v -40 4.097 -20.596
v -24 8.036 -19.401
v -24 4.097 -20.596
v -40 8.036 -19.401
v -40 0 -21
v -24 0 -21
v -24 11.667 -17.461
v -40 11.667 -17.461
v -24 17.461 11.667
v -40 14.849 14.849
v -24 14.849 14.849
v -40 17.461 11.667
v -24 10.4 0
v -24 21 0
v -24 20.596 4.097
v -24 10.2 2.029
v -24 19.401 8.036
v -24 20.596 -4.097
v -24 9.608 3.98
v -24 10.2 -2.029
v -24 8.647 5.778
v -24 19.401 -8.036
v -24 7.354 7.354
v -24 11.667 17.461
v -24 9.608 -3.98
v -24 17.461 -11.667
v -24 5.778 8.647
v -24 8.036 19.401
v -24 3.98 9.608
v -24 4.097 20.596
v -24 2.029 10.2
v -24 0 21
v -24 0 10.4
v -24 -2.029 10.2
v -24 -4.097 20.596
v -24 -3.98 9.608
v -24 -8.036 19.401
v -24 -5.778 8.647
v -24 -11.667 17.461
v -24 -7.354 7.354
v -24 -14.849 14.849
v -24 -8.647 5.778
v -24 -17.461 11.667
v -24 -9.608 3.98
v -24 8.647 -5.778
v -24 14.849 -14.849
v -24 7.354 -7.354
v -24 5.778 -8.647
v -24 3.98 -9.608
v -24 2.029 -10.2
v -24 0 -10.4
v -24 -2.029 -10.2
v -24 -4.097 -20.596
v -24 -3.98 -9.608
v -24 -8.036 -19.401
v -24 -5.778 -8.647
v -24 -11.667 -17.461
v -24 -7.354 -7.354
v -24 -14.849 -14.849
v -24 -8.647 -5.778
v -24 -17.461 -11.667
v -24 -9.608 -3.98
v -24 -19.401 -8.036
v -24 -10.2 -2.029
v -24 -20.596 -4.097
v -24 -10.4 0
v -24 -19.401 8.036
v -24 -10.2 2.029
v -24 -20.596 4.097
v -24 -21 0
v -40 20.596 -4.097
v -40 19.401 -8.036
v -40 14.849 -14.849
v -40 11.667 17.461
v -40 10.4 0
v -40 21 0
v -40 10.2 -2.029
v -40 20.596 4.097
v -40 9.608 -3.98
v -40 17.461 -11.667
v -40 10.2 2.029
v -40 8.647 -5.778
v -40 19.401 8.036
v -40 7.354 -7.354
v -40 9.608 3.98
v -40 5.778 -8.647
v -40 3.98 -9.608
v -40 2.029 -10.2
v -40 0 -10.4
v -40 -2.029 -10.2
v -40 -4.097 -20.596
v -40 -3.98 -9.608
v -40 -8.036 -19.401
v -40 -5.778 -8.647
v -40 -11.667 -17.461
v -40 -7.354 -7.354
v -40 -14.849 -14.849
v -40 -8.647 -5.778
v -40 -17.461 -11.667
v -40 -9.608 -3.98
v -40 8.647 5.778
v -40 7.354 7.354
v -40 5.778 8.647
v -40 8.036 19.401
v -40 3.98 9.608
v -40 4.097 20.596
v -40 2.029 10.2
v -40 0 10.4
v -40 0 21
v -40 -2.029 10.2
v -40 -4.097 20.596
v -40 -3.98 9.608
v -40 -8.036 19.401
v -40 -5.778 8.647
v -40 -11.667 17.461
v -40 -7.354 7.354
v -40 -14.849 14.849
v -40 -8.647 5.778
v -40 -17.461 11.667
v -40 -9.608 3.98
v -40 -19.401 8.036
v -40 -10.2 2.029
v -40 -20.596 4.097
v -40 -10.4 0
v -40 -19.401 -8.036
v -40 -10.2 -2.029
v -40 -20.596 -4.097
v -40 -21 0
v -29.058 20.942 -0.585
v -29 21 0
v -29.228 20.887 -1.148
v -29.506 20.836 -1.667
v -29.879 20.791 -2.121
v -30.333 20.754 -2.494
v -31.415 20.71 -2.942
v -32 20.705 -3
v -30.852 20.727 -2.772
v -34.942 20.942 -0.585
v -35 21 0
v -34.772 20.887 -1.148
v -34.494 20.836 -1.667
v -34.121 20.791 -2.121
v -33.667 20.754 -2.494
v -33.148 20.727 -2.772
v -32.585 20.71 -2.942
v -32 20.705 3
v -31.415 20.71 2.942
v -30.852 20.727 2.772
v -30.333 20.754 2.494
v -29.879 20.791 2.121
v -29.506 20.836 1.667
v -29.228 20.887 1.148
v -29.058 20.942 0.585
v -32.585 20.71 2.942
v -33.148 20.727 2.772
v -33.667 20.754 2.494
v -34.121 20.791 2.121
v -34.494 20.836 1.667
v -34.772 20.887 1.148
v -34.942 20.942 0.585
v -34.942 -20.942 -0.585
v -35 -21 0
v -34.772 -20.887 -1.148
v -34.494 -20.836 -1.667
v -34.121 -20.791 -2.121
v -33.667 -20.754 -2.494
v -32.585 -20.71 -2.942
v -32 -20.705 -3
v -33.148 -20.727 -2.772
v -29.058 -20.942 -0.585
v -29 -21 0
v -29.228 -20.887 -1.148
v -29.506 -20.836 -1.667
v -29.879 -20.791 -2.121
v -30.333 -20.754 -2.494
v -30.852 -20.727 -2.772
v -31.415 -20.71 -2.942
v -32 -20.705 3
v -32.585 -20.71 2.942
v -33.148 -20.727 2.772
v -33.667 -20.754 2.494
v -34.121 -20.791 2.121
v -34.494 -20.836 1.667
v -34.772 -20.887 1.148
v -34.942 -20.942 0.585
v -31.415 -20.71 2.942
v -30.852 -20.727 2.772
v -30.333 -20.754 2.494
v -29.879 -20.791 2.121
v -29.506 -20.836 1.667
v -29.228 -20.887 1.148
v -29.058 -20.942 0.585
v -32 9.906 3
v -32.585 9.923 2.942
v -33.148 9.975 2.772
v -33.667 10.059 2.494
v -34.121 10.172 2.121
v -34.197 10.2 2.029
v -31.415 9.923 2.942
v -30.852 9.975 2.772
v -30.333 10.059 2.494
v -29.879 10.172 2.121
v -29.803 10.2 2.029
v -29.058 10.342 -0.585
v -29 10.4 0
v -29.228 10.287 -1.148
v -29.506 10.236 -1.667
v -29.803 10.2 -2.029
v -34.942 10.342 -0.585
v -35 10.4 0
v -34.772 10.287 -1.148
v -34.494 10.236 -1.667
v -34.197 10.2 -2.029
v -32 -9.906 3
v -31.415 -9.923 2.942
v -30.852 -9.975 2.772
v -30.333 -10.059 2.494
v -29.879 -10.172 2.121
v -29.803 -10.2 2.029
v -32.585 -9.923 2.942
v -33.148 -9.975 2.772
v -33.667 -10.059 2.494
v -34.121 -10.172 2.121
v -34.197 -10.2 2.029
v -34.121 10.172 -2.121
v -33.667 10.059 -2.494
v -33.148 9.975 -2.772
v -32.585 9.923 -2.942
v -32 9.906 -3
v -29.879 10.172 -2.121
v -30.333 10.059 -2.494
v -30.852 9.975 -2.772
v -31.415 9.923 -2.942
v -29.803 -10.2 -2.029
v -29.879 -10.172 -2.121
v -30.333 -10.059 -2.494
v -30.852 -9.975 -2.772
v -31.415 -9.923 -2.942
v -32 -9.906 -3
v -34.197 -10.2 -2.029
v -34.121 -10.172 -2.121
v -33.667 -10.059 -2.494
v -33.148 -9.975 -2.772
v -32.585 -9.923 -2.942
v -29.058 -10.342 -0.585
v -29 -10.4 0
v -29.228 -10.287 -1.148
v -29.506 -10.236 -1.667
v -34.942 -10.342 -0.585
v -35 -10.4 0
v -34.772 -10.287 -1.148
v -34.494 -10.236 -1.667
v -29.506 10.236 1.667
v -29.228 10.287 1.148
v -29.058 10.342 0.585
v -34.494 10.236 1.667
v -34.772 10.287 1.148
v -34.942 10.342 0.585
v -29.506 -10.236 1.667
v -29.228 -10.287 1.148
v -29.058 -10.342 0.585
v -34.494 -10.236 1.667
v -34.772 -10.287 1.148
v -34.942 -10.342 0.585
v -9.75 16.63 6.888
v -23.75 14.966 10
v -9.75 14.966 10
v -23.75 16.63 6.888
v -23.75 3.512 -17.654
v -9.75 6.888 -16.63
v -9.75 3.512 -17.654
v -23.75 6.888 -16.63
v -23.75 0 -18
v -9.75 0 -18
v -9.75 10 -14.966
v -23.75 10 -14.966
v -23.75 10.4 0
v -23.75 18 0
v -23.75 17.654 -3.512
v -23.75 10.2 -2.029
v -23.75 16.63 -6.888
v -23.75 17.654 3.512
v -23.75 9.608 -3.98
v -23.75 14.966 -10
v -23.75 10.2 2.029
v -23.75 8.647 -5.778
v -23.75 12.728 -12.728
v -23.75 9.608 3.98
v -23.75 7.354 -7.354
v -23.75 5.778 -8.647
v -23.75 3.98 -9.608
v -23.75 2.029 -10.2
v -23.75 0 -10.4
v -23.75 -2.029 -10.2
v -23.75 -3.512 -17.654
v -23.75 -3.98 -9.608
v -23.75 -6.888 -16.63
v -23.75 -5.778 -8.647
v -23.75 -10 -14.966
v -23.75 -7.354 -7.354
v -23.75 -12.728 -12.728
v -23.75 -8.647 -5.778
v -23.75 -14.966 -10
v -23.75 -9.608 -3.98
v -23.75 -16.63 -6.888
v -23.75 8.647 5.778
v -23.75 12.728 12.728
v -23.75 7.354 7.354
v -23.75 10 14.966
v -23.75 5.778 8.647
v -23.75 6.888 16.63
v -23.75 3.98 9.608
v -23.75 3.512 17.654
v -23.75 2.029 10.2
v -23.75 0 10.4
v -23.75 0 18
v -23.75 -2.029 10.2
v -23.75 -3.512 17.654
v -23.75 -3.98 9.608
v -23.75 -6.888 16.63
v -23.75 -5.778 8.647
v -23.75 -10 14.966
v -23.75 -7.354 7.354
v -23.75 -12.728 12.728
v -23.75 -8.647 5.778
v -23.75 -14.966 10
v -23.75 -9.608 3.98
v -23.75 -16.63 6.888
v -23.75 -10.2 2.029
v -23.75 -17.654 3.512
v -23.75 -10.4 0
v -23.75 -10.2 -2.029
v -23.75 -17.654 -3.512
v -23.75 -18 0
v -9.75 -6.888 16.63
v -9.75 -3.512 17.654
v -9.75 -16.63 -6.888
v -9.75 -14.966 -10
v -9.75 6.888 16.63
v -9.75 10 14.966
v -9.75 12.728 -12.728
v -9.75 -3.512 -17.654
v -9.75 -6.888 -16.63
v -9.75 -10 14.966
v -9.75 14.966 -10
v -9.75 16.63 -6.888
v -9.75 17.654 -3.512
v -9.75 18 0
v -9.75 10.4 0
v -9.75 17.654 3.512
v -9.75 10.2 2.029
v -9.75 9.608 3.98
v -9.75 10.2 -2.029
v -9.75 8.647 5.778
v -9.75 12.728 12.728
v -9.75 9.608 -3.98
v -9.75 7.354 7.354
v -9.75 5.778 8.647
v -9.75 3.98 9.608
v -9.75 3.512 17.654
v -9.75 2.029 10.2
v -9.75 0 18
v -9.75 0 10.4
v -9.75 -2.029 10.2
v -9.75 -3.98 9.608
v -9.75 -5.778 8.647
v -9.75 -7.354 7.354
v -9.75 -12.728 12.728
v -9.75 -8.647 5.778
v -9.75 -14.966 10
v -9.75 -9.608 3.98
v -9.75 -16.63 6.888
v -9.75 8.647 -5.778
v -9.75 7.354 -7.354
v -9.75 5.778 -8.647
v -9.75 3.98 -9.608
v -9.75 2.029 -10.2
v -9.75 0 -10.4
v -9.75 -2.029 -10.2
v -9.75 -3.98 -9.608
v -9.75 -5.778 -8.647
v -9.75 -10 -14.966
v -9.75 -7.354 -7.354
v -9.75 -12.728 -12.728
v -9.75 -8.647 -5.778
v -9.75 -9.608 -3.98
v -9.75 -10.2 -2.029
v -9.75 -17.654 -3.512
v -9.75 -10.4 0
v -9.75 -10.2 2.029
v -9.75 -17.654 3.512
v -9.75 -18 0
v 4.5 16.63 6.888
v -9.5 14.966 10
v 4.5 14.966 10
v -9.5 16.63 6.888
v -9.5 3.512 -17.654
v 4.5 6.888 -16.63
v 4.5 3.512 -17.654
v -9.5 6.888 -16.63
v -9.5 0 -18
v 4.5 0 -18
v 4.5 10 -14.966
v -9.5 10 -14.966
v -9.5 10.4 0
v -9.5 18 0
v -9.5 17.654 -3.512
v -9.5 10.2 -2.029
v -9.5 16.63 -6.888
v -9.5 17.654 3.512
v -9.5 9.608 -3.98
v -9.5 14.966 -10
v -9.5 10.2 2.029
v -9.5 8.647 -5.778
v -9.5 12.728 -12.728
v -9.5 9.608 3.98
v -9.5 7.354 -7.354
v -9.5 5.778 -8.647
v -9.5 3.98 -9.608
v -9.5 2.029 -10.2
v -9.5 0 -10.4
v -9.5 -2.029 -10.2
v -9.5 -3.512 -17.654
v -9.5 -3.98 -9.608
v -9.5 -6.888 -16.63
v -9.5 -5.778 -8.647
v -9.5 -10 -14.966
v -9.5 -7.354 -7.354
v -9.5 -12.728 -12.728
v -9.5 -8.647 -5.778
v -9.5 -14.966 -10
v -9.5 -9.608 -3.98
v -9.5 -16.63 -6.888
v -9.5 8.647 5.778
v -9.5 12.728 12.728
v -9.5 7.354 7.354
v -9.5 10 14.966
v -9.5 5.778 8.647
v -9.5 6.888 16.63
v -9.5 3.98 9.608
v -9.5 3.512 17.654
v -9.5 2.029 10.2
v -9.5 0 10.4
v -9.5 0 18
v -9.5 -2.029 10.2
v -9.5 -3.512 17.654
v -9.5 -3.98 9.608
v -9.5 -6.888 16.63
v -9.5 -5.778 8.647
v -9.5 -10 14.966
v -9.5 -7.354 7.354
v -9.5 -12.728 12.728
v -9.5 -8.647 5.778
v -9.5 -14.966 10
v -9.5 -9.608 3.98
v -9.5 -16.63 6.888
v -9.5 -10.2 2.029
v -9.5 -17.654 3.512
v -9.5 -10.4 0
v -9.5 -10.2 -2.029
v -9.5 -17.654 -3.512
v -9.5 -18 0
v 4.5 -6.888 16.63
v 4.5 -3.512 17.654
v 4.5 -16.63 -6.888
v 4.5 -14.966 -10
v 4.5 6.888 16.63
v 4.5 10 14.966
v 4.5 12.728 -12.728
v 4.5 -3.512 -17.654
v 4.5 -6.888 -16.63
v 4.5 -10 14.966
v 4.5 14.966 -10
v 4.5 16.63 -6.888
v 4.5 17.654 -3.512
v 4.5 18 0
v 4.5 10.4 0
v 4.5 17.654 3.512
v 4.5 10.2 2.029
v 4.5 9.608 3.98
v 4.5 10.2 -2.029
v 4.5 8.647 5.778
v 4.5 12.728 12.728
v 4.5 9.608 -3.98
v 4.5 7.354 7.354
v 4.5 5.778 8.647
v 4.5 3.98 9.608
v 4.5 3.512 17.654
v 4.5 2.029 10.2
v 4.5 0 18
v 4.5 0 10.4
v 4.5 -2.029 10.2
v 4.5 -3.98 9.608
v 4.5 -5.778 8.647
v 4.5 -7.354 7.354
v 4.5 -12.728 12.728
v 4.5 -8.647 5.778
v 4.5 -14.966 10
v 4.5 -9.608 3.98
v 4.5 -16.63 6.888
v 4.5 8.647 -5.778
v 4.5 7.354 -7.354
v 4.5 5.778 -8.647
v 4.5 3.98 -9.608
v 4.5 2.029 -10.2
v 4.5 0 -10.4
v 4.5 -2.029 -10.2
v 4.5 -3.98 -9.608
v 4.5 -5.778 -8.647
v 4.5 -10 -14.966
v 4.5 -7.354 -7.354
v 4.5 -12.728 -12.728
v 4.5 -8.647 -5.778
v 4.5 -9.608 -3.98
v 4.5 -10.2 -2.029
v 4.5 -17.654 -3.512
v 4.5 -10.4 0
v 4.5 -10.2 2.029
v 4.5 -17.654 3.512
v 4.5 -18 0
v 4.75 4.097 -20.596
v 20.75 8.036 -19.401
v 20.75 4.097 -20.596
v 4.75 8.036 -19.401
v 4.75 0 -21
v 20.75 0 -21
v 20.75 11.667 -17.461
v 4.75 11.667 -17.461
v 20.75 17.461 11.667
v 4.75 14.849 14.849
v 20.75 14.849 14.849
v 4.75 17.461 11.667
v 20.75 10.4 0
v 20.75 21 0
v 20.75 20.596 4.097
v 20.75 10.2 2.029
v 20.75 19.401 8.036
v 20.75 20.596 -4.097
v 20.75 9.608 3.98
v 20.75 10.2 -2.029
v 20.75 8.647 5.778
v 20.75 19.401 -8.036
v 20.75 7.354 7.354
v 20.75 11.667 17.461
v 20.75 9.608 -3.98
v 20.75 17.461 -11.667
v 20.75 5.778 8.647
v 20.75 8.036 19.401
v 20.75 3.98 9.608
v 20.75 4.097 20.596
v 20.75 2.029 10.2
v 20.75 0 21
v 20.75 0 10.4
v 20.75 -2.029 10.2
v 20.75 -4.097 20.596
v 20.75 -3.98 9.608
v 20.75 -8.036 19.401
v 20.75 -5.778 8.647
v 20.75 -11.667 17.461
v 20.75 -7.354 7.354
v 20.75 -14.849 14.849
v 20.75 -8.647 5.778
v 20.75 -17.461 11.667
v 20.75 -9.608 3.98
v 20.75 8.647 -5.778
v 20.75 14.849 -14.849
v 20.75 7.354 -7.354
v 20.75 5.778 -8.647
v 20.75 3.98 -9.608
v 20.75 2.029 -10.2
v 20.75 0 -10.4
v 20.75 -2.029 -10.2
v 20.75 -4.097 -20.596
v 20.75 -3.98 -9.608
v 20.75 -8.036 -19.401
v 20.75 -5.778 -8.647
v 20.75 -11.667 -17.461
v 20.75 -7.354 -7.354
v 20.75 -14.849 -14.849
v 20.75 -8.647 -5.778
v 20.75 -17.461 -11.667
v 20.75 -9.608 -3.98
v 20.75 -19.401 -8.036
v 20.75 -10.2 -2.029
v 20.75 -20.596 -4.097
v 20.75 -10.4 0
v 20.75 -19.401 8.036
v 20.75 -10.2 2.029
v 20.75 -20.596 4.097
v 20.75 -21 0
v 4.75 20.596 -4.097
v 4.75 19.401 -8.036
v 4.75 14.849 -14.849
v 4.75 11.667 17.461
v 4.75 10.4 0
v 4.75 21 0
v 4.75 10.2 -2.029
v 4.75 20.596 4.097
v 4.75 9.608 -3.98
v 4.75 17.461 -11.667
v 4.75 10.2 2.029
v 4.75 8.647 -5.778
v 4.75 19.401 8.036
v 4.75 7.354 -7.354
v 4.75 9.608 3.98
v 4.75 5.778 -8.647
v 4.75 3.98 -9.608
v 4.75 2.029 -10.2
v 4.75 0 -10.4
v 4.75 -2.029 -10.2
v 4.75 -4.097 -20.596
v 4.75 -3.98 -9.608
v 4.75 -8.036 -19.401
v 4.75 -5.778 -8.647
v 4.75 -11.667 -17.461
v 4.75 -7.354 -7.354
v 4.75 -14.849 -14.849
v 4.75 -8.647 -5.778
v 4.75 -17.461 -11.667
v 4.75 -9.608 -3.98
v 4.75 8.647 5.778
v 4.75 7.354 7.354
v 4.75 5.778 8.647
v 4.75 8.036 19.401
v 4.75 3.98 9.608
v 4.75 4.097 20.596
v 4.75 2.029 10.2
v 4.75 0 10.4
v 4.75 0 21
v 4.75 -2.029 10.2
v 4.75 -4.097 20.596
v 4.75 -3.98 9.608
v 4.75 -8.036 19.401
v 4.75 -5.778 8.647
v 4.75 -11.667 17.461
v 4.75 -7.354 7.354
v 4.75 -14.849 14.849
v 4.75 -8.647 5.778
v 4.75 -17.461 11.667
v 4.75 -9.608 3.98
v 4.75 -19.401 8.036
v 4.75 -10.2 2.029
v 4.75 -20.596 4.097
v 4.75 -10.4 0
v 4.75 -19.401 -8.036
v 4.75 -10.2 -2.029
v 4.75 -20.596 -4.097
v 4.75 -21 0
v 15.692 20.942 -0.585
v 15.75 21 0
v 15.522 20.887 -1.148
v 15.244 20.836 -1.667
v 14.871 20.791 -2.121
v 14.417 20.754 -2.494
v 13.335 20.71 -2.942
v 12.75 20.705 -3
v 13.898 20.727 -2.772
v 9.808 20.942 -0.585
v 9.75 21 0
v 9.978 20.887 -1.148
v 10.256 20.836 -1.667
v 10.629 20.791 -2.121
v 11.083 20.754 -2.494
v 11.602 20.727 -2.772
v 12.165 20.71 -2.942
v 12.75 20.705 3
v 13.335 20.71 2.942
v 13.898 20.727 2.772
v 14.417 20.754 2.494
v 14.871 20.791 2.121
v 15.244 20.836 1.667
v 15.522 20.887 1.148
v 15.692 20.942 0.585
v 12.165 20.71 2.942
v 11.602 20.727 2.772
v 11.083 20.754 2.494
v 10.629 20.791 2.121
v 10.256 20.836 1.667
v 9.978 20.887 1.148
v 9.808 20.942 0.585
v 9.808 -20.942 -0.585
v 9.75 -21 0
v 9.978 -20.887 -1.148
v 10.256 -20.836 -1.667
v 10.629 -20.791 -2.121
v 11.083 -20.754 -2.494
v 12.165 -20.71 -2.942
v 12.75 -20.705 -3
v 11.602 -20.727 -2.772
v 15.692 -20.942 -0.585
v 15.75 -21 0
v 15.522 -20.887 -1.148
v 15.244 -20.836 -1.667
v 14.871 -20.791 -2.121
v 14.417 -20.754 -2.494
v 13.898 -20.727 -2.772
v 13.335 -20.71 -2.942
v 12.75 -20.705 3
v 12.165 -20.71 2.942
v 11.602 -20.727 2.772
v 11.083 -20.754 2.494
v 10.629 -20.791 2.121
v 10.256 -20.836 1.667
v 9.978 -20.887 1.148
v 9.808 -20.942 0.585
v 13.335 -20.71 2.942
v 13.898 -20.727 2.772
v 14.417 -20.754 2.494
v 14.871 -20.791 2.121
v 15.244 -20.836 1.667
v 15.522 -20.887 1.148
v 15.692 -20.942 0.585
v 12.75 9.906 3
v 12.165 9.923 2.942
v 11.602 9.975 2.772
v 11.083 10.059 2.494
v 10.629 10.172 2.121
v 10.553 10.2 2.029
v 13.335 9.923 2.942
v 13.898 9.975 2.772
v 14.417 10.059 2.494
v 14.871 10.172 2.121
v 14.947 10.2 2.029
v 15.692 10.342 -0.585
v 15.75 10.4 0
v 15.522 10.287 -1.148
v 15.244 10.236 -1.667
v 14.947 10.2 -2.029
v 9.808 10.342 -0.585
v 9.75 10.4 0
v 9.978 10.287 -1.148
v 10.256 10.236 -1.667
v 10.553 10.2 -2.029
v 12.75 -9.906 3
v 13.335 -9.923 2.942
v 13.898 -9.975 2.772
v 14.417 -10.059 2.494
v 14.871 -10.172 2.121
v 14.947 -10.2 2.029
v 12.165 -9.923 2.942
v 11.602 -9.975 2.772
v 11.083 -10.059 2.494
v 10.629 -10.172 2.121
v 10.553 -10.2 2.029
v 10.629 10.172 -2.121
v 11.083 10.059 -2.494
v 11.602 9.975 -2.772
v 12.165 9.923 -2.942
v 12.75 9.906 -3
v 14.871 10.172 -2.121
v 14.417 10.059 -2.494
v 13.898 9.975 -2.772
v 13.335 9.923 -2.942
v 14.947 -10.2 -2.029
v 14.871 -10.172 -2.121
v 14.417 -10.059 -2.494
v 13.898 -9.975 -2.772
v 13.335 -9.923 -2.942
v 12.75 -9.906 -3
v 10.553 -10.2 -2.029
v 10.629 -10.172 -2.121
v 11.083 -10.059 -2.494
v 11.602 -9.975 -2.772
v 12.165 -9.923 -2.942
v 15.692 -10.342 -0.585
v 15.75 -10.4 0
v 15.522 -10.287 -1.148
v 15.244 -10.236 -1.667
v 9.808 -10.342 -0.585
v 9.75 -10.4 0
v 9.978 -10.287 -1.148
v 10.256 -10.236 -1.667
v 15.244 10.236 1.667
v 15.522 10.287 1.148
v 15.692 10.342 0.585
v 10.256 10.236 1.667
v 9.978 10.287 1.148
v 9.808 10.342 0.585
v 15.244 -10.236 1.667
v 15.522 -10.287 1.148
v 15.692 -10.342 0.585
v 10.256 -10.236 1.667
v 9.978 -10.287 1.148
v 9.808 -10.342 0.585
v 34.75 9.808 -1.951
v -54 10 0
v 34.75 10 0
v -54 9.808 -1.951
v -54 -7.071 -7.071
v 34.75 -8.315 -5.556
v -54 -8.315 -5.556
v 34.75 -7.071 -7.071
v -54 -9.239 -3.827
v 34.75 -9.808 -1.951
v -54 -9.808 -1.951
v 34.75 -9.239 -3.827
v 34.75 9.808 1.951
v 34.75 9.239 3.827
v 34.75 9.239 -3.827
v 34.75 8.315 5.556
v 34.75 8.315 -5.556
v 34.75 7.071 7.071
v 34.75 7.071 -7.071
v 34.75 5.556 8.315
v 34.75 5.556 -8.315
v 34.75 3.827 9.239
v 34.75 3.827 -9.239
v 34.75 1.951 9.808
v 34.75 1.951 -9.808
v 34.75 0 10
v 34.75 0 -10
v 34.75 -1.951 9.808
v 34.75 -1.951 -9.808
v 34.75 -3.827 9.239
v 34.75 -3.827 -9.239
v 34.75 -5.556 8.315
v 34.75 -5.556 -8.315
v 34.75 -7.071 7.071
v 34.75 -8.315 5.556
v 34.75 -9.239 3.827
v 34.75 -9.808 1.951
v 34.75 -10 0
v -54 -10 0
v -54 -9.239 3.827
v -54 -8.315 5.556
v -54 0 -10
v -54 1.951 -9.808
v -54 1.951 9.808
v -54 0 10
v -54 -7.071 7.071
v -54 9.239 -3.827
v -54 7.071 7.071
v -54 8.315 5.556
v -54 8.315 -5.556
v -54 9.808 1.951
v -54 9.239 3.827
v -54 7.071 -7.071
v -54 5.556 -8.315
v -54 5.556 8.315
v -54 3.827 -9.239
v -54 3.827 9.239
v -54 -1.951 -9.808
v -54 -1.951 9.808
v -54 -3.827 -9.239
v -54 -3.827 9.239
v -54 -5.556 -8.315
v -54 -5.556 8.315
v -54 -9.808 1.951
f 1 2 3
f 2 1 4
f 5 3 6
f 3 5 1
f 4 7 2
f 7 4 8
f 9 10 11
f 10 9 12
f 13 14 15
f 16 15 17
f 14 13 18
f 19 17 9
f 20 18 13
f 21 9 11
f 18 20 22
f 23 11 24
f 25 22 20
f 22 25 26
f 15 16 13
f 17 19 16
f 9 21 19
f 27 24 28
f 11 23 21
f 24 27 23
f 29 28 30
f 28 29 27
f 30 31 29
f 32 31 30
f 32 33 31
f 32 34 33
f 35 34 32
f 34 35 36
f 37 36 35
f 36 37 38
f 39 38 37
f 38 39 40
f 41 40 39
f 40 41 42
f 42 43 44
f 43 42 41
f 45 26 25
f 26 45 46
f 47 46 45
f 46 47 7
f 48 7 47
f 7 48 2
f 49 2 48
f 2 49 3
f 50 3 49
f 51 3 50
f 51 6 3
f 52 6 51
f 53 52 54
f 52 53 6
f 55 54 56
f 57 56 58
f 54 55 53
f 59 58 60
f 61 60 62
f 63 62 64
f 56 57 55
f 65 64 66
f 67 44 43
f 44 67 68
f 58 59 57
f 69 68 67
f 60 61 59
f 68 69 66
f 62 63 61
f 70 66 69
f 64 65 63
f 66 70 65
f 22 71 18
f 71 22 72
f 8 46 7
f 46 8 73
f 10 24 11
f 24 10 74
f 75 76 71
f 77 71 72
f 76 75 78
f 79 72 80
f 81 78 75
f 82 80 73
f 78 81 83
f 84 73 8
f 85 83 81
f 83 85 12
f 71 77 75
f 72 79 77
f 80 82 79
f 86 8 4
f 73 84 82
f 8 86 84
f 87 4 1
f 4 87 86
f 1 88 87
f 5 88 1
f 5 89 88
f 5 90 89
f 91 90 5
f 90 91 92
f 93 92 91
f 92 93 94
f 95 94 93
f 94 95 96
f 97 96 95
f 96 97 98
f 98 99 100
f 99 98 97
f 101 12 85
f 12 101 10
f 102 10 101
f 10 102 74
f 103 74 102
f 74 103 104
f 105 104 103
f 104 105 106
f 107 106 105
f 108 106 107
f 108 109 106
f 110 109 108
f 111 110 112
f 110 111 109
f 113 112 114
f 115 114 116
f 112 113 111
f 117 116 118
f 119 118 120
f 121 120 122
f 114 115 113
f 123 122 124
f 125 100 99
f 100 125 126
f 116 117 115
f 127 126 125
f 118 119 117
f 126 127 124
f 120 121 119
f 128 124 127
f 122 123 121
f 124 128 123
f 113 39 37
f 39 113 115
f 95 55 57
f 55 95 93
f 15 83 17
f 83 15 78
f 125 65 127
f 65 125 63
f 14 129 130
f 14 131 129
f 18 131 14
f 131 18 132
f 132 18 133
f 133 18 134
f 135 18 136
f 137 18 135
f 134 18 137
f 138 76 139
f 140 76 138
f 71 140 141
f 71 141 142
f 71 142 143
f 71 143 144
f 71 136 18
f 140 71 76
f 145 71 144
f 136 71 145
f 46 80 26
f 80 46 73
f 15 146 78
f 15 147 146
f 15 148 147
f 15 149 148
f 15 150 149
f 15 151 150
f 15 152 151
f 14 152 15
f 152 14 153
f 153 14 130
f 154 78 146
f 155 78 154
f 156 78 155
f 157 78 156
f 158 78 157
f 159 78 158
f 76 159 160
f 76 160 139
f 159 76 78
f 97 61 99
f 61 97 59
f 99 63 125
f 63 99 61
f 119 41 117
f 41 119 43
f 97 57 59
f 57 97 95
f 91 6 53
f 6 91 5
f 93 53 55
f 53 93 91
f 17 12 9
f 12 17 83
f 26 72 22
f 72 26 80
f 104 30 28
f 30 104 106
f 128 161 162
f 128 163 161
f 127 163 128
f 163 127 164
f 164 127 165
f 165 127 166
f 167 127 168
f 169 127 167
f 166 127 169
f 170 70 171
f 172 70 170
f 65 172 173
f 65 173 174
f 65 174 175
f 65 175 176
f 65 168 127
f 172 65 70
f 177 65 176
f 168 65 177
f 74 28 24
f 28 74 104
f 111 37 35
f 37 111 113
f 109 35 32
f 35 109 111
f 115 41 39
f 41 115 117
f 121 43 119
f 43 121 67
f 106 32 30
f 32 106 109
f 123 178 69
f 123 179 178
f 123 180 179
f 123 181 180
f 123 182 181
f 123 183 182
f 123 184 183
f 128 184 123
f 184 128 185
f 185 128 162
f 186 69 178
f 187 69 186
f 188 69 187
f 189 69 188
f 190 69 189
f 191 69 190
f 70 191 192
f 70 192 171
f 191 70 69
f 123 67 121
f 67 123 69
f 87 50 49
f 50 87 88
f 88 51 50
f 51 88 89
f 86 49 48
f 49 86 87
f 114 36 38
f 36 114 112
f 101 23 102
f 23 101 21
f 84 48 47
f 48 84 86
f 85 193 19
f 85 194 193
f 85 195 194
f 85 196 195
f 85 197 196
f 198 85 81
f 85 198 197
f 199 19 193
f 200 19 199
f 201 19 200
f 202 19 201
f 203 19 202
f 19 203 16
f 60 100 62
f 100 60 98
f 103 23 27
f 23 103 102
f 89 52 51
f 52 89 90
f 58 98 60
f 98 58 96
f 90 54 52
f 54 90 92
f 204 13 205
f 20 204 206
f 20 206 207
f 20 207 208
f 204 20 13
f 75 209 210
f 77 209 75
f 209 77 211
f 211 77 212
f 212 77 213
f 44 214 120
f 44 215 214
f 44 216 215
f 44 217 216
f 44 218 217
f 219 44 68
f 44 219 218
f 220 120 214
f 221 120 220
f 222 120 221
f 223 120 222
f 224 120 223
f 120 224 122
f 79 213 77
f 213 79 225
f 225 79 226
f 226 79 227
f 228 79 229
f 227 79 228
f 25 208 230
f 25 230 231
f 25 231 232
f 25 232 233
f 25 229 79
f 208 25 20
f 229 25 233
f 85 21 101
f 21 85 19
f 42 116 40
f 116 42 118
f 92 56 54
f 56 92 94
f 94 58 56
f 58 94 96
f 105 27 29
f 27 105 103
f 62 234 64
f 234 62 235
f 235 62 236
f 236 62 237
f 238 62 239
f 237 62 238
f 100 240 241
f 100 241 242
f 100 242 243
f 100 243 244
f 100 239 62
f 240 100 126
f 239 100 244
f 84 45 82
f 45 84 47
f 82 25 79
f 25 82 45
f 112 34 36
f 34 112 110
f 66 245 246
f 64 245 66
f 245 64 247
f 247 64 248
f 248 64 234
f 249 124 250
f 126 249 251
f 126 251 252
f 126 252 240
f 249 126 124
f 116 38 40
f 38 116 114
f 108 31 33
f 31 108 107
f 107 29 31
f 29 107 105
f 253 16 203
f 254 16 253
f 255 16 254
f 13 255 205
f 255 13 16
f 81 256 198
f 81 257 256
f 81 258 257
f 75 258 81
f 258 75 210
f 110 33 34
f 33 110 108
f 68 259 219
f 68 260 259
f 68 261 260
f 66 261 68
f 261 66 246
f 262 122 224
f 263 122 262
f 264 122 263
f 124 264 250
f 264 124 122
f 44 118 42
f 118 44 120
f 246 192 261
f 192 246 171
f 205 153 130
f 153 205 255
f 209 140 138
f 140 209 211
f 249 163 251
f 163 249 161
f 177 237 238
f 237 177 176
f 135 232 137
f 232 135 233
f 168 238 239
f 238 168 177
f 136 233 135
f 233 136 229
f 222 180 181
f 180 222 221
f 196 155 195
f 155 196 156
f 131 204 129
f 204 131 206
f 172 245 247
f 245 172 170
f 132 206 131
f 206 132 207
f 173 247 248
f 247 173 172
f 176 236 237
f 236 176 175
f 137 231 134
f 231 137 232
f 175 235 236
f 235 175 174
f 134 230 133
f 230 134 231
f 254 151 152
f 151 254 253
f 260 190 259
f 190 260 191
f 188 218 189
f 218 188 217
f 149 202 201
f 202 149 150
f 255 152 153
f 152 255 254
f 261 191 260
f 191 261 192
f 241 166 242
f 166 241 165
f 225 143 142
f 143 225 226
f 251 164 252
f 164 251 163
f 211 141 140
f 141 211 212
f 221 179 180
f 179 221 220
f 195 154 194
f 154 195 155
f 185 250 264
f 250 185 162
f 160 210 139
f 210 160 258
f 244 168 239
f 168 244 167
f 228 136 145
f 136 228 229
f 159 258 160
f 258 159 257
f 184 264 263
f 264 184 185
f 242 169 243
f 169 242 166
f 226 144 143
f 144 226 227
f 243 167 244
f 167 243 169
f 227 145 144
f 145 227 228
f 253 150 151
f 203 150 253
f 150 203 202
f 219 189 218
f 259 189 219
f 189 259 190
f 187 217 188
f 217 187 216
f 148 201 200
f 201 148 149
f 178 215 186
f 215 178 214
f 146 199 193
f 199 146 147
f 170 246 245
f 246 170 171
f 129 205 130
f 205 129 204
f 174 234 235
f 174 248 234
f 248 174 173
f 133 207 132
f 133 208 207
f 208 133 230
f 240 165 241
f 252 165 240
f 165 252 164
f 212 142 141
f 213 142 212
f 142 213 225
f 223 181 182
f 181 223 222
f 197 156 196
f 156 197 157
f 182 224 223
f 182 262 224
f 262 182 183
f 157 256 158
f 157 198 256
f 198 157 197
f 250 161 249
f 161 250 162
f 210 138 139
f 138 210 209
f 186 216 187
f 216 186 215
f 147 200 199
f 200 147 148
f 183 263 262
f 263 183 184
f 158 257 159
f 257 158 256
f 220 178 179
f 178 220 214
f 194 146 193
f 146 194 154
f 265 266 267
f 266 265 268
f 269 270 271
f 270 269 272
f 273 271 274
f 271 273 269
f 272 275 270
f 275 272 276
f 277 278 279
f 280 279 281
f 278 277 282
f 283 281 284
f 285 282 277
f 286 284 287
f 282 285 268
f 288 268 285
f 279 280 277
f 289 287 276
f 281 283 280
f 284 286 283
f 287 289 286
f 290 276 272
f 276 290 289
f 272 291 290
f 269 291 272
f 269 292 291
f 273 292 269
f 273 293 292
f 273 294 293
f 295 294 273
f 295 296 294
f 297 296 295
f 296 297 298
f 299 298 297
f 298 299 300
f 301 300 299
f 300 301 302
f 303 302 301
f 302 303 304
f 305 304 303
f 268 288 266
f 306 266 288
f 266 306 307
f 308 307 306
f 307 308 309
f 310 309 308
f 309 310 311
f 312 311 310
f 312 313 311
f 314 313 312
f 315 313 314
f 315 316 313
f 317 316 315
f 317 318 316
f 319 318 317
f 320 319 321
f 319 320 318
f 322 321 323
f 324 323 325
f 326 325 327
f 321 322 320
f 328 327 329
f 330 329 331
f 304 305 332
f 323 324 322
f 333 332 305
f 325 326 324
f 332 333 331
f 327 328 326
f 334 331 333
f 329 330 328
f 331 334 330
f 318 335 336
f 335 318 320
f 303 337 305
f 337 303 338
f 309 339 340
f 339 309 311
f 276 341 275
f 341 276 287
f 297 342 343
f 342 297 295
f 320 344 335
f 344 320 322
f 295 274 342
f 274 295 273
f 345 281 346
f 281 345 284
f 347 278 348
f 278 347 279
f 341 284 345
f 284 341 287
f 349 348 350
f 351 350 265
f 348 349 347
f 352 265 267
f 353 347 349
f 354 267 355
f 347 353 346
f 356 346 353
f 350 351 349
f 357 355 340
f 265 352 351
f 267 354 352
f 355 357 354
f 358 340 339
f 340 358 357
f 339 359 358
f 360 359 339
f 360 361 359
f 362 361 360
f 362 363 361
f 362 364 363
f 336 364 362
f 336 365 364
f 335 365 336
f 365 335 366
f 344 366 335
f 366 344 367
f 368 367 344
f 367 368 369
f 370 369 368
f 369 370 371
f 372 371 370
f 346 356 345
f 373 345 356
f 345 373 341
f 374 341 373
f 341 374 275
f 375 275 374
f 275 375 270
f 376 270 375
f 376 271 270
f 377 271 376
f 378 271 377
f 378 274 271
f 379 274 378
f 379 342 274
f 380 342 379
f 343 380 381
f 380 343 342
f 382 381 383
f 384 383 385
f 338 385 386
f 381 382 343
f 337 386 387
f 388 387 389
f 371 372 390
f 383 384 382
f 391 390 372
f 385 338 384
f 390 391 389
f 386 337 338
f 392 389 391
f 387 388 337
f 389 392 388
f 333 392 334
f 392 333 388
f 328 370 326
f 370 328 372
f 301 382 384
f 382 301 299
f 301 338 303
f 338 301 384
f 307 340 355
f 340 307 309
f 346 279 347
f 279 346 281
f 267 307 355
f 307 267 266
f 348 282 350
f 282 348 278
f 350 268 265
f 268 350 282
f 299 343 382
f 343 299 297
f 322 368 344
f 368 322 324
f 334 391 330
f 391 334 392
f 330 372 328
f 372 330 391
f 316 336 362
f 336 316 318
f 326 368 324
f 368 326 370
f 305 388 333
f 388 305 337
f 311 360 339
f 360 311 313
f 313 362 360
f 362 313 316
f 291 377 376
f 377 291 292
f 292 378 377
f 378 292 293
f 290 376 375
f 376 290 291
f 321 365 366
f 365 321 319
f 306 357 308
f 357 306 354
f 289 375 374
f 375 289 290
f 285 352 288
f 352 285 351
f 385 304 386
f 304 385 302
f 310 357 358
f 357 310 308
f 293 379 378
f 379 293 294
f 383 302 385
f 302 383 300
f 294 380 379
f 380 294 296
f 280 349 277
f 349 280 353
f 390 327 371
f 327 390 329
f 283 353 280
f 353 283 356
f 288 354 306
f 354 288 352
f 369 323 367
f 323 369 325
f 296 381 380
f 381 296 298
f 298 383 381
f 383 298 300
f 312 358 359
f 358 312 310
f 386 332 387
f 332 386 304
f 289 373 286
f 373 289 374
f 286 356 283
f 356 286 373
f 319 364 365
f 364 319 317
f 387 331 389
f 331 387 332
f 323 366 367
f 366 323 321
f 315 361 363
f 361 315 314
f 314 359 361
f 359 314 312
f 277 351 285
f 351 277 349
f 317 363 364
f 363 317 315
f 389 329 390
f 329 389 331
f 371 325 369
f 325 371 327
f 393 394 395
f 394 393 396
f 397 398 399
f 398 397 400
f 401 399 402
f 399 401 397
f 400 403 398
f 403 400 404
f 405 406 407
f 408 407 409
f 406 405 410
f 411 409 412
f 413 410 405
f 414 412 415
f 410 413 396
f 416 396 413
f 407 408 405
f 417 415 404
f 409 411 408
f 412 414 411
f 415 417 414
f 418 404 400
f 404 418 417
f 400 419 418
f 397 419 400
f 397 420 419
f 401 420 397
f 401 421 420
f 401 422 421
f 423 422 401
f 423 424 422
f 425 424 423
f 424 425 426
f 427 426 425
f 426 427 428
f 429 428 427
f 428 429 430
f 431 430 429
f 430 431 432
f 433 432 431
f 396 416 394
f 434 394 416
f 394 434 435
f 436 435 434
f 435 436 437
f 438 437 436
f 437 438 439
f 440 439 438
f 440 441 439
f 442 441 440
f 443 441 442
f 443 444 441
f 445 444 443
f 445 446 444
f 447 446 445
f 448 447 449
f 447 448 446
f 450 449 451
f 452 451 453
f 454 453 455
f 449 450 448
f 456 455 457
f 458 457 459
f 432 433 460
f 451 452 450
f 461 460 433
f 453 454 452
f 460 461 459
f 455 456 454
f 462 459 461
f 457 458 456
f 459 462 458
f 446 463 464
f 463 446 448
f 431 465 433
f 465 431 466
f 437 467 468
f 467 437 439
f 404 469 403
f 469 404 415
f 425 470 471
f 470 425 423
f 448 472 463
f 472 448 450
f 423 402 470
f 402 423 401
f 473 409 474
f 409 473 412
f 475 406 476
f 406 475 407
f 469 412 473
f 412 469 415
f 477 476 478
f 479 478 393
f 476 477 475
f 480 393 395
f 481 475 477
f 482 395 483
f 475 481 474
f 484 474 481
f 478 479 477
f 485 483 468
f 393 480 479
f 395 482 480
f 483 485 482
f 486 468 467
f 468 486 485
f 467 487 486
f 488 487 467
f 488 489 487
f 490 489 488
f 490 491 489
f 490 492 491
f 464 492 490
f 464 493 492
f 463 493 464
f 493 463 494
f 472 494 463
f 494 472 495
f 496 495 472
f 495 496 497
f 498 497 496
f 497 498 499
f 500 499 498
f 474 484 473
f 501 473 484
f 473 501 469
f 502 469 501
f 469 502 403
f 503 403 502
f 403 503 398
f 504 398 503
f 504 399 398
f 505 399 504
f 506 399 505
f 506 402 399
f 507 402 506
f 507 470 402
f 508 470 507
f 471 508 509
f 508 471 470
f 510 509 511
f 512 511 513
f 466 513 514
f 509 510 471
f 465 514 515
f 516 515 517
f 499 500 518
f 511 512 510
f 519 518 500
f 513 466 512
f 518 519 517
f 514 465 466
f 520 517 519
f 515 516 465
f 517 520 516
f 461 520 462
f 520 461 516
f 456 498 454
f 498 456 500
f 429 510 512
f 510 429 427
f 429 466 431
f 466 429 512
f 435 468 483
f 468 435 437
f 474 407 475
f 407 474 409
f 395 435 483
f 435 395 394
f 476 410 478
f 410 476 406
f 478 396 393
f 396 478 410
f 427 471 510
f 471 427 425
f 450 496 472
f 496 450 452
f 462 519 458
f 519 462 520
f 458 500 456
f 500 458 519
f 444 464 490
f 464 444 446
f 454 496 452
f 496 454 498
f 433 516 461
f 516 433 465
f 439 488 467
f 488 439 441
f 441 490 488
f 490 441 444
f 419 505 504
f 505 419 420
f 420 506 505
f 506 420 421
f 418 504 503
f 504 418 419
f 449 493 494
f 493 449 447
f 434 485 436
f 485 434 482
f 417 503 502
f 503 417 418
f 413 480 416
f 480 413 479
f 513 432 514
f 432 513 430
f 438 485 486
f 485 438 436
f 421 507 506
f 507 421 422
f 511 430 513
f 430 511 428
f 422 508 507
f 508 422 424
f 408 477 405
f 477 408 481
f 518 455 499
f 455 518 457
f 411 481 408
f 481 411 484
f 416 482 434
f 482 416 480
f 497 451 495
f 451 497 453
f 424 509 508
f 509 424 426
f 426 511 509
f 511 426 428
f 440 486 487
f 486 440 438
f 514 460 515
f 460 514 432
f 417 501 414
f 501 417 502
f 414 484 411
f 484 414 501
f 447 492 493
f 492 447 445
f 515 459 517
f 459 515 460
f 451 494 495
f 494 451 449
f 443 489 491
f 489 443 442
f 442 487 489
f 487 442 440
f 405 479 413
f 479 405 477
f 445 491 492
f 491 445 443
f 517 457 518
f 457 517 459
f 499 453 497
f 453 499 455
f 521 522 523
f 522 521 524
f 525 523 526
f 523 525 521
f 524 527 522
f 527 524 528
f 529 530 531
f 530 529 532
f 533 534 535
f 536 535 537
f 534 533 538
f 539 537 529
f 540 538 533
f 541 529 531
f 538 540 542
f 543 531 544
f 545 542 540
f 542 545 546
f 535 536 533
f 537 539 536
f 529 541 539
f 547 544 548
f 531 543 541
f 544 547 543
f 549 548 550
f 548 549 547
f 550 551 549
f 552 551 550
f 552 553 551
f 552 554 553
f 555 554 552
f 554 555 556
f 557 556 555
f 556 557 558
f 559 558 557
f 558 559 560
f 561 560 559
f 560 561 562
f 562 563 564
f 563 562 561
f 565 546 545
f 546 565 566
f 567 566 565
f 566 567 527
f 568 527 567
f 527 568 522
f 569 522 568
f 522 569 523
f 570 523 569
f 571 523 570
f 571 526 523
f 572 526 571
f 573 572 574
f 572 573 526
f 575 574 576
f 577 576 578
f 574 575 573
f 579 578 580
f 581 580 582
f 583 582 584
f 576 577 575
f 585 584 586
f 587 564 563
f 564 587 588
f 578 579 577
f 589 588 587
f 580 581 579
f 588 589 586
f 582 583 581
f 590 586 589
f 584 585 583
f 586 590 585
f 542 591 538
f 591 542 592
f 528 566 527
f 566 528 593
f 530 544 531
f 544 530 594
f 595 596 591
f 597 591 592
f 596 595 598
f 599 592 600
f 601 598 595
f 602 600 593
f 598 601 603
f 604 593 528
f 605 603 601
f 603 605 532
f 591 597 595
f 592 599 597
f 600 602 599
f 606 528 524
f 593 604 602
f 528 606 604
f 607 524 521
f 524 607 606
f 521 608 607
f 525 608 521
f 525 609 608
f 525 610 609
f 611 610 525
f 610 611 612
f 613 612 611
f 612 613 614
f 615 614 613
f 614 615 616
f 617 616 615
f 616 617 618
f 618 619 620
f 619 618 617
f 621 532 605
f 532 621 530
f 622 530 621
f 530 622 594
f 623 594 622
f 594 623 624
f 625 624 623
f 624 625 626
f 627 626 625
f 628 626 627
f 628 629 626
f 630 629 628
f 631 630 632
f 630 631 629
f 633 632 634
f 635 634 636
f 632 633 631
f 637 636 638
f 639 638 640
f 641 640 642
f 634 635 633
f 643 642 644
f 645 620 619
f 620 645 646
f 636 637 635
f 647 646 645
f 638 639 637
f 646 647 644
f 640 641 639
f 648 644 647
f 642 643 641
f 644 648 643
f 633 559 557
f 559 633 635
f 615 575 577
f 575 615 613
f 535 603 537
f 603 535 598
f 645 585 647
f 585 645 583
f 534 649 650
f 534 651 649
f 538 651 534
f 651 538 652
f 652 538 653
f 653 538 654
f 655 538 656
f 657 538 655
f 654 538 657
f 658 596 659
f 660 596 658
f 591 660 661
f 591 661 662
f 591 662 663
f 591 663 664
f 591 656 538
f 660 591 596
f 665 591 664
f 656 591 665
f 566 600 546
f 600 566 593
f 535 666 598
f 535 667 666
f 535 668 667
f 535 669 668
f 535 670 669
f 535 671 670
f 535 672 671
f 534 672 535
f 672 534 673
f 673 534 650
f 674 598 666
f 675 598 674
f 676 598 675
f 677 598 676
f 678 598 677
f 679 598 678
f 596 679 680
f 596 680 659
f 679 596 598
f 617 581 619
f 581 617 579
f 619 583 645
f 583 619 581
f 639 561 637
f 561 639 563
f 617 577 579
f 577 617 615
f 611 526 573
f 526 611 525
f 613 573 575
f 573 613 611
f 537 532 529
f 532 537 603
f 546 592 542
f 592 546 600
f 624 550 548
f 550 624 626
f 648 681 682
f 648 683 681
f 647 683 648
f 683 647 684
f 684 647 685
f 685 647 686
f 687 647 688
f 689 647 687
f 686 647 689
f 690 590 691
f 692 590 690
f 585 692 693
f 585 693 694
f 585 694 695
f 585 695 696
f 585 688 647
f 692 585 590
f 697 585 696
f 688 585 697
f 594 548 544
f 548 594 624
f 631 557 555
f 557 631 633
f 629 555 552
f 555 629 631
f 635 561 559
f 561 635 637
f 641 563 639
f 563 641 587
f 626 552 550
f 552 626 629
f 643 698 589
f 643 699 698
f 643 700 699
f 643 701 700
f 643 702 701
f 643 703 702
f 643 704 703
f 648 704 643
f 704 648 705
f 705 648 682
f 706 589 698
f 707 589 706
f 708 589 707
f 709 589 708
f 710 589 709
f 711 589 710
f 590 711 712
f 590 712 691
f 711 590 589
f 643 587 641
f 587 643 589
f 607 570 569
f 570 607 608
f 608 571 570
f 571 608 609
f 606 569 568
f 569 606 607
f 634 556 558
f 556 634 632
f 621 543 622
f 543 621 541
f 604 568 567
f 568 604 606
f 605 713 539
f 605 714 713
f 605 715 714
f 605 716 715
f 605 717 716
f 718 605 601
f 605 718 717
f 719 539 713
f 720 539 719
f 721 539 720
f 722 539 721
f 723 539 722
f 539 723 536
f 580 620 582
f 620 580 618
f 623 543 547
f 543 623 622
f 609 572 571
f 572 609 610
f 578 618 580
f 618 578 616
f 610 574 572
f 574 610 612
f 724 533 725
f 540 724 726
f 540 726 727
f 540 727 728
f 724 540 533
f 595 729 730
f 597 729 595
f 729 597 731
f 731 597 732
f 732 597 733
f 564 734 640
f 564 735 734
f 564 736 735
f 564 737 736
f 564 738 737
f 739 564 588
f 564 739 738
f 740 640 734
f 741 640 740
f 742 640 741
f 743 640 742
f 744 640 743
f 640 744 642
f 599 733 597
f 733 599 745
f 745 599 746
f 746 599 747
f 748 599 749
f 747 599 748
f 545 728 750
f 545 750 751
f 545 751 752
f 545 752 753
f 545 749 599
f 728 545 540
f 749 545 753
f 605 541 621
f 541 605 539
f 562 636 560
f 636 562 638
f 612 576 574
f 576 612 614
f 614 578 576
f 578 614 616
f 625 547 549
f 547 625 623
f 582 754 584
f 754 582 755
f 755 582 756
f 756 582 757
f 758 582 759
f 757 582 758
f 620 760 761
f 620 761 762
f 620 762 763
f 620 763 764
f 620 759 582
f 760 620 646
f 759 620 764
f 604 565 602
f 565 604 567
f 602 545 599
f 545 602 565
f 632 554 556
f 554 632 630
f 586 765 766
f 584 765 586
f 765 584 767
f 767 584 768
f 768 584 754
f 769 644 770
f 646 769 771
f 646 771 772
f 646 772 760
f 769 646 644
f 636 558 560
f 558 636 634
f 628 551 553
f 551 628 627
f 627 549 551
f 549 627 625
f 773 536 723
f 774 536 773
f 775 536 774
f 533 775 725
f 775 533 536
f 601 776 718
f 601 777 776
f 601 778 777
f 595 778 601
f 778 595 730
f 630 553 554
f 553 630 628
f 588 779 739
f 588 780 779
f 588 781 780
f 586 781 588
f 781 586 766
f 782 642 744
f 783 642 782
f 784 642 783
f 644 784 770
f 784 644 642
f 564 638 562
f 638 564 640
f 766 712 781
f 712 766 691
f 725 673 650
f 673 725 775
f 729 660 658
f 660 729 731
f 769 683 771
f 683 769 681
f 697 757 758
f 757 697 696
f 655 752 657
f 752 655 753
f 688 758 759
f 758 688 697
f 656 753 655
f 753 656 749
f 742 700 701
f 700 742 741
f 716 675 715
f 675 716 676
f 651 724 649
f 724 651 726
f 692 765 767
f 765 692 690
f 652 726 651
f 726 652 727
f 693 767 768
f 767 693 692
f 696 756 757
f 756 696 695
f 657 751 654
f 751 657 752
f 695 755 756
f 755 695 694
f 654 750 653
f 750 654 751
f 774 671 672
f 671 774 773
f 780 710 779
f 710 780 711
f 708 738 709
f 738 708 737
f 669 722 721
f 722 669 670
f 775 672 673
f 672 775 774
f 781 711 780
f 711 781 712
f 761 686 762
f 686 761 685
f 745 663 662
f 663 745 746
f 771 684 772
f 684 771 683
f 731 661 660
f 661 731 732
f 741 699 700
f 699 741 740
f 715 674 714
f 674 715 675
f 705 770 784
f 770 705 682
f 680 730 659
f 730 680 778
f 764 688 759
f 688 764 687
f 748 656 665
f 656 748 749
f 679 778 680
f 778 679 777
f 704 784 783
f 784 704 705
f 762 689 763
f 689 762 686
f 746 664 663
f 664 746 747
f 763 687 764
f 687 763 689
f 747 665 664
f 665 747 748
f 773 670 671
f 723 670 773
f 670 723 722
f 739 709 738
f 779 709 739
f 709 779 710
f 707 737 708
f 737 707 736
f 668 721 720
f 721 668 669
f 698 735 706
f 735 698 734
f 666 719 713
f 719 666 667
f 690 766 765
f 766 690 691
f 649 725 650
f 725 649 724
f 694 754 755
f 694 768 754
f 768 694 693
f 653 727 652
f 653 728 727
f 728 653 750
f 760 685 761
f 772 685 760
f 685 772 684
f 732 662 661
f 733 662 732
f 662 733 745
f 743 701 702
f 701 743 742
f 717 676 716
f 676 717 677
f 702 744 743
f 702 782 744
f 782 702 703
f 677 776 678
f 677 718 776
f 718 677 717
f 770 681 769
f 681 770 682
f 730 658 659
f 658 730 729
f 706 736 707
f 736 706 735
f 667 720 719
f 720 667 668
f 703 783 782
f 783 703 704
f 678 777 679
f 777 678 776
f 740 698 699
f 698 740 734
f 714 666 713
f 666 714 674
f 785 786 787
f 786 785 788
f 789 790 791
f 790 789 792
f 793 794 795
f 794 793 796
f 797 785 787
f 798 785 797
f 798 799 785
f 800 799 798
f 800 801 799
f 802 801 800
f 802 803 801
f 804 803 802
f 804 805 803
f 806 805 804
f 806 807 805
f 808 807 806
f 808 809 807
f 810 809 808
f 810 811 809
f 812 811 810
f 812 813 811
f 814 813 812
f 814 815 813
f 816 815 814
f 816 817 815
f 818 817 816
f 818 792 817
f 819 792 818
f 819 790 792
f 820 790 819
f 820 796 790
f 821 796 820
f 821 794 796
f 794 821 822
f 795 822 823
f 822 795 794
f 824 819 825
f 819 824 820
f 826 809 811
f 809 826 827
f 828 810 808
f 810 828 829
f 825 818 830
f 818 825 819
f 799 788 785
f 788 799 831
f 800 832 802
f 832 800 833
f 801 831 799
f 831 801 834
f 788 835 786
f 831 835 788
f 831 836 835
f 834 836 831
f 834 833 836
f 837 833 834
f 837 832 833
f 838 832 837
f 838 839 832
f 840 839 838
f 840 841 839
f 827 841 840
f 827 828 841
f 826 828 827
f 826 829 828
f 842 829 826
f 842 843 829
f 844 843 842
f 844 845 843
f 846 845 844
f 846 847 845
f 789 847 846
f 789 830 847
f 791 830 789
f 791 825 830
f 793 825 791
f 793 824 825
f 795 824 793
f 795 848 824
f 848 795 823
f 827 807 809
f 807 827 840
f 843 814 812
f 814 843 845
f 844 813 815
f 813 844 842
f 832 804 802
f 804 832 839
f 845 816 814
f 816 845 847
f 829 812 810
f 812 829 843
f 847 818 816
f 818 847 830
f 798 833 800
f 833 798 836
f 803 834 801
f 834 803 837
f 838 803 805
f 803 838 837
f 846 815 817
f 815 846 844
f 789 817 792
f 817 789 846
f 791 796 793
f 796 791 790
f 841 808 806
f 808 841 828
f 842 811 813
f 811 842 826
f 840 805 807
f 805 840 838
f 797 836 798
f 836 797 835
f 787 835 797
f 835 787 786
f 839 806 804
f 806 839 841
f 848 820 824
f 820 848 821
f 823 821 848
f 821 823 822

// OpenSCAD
$fn = 32;

// ------------------------------------------------------------------------
// Shaft with rings and collars: d20 shaft, 4 rings
// Every part is its own module, assembly() places them once.
// ------------------------------------------------------------------------

// --- part 1 ---
module shaft() {
  translate([0, 0, -44.375]) cylinder(h = 88.75, d = 20);
}

// --- part 2 ---
module collar_a() {
  difference() {
    cylinder(h = 16, d = 42);
    translate([0, 0, -1]) cylinder(h = 18, d = 20.8);
    translate([0, 0, 8]) rotate([90, 0, 0]) cylinder(h = 44, d = 6, center = true);
  }
}

// --- part 3 ---
module spacer_a() {
  difference() {
      translate([0, 0, 0]) cylinder(h = 14, d = 36);
      translate([0, 0, -1]) cylinder(h = 16, d = 20.8);
    }
}

// --- part 4 ---
module spacer_b() {
  difference() {
      translate([0, 0, 0]) cylinder(h = 14, d = 36);
      translate([0, 0, -1]) cylinder(h = 16, d = 20.8);
    }
}

// --- part 5 ---
module collar_b() {
  difference() {
    cylinder(h = 16, d = 42);
    translate([0, 0, -1]) cylinder(h = 18, d = 20.8);
    translate([0, 0, 8]) rotate([90, 0, 0]) cylinder(h = 44, d = 6, center = true);
  }
}

// --- assembly ---
module assembly() {
  translate([-9.625, 0, 0]) rotate([0, 90, 0]) shaft();
  translate([-40, 0, 0]) rotate([0, 90, 0]) collar_a();
  translate([-23.75, 0, 0]) rotate([0, 90, 0]) spacer_a();
  translate([-9.5, 0, 0]) rotate([0, 90, 0]) spacer_b();
  translate([4.75, 0, 0]) rotate([0, 90, 0]) collar_b();
}

assembly();
